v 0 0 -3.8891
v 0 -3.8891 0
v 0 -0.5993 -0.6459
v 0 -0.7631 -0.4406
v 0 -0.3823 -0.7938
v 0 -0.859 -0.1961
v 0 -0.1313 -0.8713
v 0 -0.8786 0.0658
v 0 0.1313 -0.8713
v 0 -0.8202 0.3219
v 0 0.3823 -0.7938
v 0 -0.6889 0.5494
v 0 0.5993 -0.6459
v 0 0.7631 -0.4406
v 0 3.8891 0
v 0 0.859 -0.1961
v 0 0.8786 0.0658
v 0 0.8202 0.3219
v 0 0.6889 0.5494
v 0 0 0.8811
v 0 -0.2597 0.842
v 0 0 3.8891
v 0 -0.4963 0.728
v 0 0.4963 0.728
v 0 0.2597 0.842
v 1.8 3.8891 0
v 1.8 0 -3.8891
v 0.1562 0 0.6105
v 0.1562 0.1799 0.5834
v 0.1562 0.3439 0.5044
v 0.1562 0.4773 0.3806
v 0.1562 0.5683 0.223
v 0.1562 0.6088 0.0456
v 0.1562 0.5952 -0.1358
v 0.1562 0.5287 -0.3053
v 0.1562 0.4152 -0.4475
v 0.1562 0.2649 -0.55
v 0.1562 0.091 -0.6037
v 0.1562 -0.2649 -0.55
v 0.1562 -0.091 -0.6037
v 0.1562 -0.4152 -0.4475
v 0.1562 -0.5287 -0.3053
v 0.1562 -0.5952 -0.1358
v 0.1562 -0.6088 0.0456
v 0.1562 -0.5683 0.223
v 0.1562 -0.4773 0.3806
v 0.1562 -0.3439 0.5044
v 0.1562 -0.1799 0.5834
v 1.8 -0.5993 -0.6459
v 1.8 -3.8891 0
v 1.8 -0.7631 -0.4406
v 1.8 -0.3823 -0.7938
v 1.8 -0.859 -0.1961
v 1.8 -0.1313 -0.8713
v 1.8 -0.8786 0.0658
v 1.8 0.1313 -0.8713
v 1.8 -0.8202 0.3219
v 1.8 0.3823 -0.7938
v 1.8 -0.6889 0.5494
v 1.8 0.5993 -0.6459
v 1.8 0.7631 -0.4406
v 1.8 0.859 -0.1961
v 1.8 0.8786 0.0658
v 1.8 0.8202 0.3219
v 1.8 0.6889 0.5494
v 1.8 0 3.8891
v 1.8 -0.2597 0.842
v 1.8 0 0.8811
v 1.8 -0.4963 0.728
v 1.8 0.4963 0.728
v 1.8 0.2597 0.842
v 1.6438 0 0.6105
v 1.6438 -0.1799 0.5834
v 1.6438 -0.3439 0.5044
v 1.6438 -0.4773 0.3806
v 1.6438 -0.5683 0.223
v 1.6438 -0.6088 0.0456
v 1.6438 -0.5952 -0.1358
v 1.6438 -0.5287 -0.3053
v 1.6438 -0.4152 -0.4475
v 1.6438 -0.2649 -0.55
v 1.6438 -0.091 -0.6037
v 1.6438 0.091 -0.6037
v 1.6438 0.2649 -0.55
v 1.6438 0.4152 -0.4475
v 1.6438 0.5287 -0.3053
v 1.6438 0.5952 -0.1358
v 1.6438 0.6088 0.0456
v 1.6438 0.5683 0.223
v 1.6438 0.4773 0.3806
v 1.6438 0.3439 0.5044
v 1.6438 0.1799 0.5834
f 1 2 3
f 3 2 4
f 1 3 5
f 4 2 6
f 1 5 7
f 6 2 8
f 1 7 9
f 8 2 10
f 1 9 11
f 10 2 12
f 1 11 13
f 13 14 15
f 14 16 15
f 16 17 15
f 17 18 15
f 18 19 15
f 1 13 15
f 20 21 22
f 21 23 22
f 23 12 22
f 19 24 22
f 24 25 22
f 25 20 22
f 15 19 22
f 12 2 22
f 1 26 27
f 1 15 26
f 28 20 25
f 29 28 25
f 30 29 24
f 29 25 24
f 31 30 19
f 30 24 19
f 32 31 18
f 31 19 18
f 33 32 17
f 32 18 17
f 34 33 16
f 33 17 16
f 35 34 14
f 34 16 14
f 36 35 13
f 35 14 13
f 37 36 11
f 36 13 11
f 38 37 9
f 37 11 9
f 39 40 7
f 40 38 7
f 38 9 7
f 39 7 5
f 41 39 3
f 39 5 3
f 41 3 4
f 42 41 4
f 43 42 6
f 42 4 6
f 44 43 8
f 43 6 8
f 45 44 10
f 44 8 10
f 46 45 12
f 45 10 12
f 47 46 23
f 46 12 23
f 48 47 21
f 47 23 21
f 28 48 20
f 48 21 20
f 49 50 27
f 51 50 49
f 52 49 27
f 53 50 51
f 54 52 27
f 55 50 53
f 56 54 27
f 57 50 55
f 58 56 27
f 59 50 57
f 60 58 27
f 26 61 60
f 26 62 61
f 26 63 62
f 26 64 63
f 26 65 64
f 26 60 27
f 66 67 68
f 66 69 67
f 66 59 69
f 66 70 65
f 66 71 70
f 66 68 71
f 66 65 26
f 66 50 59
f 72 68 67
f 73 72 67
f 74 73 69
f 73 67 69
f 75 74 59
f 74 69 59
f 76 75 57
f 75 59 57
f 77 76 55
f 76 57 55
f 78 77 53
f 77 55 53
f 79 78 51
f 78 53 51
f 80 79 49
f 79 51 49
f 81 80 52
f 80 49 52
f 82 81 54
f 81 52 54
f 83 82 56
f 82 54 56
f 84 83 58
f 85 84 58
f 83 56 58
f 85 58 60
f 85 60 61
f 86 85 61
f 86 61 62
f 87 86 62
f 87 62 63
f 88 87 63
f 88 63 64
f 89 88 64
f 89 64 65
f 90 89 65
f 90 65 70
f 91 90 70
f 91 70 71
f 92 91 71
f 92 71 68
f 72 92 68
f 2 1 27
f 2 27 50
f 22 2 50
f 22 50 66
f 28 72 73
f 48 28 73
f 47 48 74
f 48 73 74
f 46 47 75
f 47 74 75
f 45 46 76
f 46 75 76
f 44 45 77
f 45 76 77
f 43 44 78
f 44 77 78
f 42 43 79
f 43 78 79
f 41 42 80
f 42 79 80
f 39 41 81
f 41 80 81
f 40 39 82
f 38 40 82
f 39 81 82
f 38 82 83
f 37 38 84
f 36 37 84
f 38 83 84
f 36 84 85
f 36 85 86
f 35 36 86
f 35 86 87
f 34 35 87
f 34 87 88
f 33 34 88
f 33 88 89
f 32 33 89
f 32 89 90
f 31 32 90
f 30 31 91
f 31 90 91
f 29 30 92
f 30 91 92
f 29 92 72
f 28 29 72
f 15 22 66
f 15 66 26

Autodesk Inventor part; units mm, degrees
ref_plane "YZ Plane" through (0, 0, 0) normal (1, 0, 0) x (0, 1, 0)
ref_plane "XZ Plane" through (0, 0, 0) normal (0, 1, 0) x (-1, 0, 0)
sketch "Sketch1" plane through (0, 0, 0) normal (1, 0, 0) x (0, 1, 0)
  line L0 (0, -3.8891) -> (-3.8891, 0)
  line L1 (-3.8891, 0) -> (0, 3.8891)
  line L2 (0, 3.8891) -> (3.8891, 0)
  line L3 (3.8891, 0) -> (0, -3.8891)
  line L4 (-3.1678, 0) -> (3.1678, 0) projected
  point P0 (0, 0)
  point P1 (0, 0)
  dimension "d0" = 7.7782
extrude "Body" add sketch "Sketch1" along normal blind 1.8
sketch "Sketch2" plane through (0, 0, 0) normal (-1, 0, 0) x (0, 0, 1)
  point P0 (0, 0)
  point P1 (0, 0)
hole "Thread" at (0, 0, 0) direction (1, 0, 0) diameter 1.221 end through all thread size "M1.6x0.35" class "6H" standard "ANSI Metric M Profile"
chamfer "Chamfer1" distance 0.2706 angle 30 1 edges at (0, 0, -0.6105) measured on face at (0, -1.4313, 1.4487)
chamfer "Chamfer2" distance 0.2706 angle 30 1 edges at (1.8, 0, -0.6105) measured on face at (1.8, -1.4313, 1.4487)
ref_plane "Work Plane1" through (11.1463, 0, 0) normal (0, 0.7071, -0.7071) x (-1, 0, 0)
equation "\"d0\" = 1.41421 * SW"
equation "\"d1\" = KOH"
equation "\"d3\" = -0.5 * GD1 + 0.5 * NND"
equation "\"d35\" = -0.5 * GD1 + 0.5 * NND"
equation "\"d5\" = -0.5 * GD1 + 0.5 * NND"
equation "\"d36\" = -0.5 * GD1 + 0.5 * NND"
equation "\"NND\" = 3"
equation "\"KOH\" = 1.8"
equation "\"SW\" = 5.5"
equation "\"GUL\" = 0.541266 * PTC"
equation "\"THREADDIA\" = 3"
equation "\"TOA\" = 30deg"
equation "\"PTC\" = 0.5"
equation "\"E0\" = 7"
equation "\"GAL\" = 0.541266 * PTC"
equation "\"GD1\" = 2.458734"
properties part number "DIN 562 - M3" material "Steel, Mild"
